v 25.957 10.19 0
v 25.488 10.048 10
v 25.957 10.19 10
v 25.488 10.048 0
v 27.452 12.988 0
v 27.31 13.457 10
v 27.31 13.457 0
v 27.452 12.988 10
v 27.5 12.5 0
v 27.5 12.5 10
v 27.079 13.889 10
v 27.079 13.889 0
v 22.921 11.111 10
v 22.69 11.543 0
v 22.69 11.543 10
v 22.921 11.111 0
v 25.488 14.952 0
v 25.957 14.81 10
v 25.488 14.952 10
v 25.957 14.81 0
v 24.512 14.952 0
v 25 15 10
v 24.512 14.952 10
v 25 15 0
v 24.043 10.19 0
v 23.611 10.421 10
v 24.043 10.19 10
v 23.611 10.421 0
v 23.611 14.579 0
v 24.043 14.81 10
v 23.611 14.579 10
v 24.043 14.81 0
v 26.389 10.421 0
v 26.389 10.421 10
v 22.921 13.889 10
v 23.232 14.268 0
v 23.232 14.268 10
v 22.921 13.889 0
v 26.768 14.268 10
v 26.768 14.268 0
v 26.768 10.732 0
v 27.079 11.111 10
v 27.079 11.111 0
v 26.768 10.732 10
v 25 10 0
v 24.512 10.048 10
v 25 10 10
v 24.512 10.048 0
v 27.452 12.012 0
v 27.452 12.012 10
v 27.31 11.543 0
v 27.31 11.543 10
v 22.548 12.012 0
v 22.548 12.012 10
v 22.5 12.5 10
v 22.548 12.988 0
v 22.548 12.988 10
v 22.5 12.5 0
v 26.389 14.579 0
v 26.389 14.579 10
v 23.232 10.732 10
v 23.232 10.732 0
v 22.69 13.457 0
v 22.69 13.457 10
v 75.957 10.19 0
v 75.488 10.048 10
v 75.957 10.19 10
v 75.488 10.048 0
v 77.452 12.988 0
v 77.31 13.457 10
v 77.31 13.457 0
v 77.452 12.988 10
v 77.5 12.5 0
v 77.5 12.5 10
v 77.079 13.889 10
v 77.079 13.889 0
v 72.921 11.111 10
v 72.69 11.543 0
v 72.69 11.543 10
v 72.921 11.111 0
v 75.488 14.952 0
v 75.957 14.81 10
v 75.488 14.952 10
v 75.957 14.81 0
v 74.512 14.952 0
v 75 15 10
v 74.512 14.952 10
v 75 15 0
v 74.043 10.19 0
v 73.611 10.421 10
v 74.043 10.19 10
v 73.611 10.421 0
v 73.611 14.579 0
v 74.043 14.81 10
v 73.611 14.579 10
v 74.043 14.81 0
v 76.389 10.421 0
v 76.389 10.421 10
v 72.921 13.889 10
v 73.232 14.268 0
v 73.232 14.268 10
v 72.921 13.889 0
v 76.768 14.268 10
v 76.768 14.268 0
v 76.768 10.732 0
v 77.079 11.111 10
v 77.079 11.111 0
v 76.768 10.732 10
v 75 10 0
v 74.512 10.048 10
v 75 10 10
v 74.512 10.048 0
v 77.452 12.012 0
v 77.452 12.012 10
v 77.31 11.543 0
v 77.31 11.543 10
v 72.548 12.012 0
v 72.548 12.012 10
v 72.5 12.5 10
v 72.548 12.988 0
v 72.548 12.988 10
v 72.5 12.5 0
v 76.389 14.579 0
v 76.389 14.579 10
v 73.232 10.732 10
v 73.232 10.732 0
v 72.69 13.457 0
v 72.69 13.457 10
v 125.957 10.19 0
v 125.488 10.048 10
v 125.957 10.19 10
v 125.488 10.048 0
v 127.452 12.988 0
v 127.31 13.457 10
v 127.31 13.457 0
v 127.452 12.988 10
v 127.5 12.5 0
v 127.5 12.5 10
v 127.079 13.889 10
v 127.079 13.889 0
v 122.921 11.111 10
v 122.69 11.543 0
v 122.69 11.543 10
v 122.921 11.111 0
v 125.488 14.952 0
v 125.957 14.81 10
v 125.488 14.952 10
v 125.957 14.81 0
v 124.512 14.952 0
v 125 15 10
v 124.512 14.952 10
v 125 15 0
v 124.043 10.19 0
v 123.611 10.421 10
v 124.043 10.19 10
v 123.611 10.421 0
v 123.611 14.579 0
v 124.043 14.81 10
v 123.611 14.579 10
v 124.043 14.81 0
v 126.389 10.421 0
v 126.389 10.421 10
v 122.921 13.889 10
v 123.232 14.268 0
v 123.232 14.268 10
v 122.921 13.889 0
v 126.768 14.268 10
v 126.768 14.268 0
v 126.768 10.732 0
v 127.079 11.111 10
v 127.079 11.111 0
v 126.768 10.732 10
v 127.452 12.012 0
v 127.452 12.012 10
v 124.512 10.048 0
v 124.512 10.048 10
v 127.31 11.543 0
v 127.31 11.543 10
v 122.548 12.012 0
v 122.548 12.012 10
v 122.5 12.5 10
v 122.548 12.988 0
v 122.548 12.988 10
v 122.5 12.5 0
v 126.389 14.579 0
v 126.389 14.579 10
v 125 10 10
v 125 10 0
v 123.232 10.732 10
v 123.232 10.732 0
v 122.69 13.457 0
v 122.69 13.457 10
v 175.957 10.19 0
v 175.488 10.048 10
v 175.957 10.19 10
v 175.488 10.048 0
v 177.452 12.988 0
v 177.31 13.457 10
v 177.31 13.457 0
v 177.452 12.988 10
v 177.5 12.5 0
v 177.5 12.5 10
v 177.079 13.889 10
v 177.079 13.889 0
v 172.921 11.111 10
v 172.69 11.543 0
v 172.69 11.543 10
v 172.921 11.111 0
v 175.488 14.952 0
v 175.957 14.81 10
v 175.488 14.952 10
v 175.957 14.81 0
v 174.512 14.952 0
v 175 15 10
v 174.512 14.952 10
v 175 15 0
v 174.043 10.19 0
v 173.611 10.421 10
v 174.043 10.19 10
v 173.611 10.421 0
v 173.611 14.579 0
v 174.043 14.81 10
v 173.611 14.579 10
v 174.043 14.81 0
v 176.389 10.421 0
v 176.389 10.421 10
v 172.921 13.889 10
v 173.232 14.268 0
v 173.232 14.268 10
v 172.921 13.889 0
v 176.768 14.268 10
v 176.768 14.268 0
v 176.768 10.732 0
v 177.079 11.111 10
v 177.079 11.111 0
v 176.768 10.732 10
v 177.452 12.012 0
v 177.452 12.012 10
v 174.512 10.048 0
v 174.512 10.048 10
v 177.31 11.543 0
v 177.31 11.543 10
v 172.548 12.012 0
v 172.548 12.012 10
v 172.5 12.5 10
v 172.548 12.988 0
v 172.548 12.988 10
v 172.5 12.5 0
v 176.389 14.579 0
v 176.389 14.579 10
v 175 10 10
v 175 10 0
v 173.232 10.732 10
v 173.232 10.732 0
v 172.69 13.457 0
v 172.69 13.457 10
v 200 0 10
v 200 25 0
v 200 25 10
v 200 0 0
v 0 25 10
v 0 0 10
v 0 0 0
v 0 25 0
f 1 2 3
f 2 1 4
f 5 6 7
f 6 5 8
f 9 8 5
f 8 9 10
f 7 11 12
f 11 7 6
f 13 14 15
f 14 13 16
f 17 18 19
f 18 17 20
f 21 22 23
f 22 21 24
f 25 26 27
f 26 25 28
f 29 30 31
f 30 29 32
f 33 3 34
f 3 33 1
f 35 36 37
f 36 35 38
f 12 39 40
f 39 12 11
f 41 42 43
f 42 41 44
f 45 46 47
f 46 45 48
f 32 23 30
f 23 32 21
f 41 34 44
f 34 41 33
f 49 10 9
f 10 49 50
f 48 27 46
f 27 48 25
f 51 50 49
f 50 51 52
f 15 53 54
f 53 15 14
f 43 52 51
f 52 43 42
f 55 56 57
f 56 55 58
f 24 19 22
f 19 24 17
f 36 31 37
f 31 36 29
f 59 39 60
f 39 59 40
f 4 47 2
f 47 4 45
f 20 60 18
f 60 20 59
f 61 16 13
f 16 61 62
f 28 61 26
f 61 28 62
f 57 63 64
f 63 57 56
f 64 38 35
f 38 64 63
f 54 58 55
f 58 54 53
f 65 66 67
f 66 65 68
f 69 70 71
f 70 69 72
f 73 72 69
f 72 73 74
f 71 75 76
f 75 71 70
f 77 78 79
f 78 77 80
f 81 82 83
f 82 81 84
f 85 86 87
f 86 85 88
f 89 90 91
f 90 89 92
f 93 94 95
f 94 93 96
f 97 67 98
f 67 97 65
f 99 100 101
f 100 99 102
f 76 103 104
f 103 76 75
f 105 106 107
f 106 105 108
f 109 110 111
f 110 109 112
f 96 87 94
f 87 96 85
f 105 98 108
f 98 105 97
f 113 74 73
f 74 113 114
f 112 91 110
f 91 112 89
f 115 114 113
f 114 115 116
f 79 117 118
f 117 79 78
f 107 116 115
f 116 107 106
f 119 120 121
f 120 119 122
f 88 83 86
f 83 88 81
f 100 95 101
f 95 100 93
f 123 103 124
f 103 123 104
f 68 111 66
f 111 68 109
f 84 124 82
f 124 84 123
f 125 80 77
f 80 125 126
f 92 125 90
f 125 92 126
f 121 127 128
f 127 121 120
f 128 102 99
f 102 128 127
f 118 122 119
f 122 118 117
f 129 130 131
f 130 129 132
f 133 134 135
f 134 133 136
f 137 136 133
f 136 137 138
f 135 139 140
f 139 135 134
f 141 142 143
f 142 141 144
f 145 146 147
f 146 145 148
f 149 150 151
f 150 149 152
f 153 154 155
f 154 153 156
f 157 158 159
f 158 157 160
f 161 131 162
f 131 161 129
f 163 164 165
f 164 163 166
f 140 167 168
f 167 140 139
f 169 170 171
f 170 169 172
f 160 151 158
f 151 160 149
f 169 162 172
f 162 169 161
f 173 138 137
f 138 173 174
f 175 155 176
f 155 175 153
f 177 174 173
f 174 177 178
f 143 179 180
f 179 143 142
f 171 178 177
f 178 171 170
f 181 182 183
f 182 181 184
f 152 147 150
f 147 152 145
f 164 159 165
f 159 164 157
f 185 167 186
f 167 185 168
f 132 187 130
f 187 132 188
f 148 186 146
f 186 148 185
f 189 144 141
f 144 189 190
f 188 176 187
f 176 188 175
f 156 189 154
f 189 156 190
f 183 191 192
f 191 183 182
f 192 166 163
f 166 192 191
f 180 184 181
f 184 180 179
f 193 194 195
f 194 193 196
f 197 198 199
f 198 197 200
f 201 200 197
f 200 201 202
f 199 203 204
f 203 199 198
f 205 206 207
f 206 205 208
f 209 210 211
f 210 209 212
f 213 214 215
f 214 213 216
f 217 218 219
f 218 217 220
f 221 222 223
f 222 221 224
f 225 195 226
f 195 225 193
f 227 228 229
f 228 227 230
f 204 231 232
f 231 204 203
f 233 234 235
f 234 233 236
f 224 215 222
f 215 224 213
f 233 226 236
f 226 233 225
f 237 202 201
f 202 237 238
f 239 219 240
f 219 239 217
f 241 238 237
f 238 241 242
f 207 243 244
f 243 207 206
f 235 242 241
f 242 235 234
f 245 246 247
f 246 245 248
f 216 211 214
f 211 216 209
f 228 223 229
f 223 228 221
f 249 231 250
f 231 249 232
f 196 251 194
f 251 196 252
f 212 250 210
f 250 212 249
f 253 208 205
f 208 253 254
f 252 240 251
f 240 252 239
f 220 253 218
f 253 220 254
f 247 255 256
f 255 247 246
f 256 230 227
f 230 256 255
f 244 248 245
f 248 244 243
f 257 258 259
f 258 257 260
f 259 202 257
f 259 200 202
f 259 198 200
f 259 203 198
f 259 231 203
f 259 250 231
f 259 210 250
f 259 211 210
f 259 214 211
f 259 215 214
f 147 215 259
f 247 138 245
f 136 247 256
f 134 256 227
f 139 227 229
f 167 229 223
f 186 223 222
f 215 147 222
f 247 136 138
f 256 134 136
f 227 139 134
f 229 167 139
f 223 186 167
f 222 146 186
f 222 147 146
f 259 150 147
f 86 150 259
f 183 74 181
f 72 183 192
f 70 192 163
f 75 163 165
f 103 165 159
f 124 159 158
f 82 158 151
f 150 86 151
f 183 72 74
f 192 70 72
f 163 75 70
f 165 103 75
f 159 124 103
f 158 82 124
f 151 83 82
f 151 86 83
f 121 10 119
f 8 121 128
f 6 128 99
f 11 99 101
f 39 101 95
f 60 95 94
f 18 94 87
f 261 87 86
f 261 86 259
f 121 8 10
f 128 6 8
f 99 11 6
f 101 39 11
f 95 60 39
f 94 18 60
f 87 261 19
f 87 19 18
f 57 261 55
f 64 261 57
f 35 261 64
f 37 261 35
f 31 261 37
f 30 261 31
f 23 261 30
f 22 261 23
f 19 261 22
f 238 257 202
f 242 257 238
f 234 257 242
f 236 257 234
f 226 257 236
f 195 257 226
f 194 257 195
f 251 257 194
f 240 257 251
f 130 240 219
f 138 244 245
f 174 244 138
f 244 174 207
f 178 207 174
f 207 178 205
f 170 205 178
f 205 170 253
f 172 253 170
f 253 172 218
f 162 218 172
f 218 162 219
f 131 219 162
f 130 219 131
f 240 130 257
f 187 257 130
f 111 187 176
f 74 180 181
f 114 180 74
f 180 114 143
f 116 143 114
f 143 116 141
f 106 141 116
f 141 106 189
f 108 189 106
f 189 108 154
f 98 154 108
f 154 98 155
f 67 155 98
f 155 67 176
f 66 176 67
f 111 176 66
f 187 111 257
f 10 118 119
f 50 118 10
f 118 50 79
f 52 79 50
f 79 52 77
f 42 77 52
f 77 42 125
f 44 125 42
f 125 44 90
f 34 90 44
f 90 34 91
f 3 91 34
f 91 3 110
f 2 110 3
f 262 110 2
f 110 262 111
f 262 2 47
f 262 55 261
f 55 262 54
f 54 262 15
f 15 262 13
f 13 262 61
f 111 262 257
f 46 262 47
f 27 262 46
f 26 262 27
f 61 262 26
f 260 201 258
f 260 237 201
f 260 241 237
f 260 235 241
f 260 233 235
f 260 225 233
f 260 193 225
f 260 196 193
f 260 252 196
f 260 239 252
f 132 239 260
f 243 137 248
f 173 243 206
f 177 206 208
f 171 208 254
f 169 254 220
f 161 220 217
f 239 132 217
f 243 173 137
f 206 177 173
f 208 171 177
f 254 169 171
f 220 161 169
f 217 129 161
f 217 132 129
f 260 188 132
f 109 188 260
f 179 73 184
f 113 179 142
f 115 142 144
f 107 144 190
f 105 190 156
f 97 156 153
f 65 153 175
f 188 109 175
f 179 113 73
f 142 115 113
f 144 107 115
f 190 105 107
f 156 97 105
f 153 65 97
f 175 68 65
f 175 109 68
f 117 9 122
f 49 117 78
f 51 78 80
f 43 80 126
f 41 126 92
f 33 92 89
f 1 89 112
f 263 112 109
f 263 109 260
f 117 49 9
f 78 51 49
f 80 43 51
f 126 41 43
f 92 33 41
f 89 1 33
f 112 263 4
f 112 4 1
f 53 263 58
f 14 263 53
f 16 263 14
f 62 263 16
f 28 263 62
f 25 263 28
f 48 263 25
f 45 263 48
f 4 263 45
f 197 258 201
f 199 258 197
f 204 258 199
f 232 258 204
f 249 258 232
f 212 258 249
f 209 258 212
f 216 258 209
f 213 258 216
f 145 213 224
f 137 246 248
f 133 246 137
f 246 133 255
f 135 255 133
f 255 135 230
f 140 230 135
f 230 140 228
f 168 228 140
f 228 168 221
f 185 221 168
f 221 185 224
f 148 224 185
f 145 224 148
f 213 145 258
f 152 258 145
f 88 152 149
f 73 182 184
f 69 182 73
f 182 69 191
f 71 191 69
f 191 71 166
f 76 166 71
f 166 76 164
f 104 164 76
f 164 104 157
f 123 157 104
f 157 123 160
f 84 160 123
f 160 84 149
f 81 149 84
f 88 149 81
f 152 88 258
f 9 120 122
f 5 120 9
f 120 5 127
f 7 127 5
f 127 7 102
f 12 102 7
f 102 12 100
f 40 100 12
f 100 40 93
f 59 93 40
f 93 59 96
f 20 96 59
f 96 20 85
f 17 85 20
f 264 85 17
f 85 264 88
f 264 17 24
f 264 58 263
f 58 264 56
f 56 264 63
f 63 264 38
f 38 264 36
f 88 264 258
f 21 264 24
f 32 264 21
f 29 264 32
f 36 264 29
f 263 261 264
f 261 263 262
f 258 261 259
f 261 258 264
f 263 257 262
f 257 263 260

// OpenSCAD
$fn = 32;

// ----------------------------------------------------------------------
// Long rail: 200-250 mm mounting rail
// ----------------------------------------------------------------------

// --- parameters (mm) ---
rail_l = 200;             // rail length, X
rail_w = 25;              // rail width, Y
rail_t = 10;              // rail thickness, Z
hole_d = 5;               // mounting hole diameter
hole_start = 25;          // first hole offset from the end
hole_pitch = 50;          // hole pitch
holes = 4;                // number of holes

difference() {
  cube([rail_l, rail_w, rail_t]);
  for (i = [0 : holes - 1])
    translate([hole_start + i * hole_pitch, rail_w / 2, -1])
      cylinder(h = rail_t + 2, d = hole_d);
}
